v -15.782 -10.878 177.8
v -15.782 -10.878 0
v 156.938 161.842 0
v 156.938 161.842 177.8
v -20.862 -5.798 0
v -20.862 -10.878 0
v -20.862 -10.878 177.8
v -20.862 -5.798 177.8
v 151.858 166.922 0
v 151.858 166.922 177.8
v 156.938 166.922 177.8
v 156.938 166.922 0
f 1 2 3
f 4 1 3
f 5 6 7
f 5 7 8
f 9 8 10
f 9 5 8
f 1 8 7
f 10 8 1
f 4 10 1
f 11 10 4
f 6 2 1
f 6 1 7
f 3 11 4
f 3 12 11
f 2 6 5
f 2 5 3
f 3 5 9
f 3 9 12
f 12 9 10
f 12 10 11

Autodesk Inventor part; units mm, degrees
ref_plane "YZ Plane" through (0, 0, 0) normal (1, 0, 0) x (0, 1, 0)
ref_plane "XZ Plane" through (0, 0, 0) normal (0, 1, 0) x (-1, 0, 0)
ref_plane "XY Plane" through (0, 0, 0) normal (0, 0, 1) x (1, 0, 0)
sketch "Sketch1" plane through (0, 0, 0) normal (0, 0, 1) x (1, 0, 0)
  line L0 (151.8583, 166.9217) -> (156.9383, 166.9217)
  line L1 (156.9383, 166.9217) -> (156.9383, 161.8417)
  line L2 (156.9383, -10.8783) -> (-20.8617, -10.8783)
  line L3 (-20.8617, -10.8783) -> (-20.8617, 166.9217)
  line L4 (-20.8617, -5.7983) -> (151.8583, 166.9217)
  line L5 (-15.7817, -10.8783) -> (156.9383, 161.8417)
  point P0 (0, 0)
  dimension "d0" = 177.8
  dimension "d1" = 177.8
  dimension "d2" = 45
  dimension "d3" = 45
  dimension "d4" = 5.08
  dimension "d5" = 5.08
extrude "Extrusion1" add sketch "Sketch1" along normal blind 177.8
properties part number "Redirection Plate"
